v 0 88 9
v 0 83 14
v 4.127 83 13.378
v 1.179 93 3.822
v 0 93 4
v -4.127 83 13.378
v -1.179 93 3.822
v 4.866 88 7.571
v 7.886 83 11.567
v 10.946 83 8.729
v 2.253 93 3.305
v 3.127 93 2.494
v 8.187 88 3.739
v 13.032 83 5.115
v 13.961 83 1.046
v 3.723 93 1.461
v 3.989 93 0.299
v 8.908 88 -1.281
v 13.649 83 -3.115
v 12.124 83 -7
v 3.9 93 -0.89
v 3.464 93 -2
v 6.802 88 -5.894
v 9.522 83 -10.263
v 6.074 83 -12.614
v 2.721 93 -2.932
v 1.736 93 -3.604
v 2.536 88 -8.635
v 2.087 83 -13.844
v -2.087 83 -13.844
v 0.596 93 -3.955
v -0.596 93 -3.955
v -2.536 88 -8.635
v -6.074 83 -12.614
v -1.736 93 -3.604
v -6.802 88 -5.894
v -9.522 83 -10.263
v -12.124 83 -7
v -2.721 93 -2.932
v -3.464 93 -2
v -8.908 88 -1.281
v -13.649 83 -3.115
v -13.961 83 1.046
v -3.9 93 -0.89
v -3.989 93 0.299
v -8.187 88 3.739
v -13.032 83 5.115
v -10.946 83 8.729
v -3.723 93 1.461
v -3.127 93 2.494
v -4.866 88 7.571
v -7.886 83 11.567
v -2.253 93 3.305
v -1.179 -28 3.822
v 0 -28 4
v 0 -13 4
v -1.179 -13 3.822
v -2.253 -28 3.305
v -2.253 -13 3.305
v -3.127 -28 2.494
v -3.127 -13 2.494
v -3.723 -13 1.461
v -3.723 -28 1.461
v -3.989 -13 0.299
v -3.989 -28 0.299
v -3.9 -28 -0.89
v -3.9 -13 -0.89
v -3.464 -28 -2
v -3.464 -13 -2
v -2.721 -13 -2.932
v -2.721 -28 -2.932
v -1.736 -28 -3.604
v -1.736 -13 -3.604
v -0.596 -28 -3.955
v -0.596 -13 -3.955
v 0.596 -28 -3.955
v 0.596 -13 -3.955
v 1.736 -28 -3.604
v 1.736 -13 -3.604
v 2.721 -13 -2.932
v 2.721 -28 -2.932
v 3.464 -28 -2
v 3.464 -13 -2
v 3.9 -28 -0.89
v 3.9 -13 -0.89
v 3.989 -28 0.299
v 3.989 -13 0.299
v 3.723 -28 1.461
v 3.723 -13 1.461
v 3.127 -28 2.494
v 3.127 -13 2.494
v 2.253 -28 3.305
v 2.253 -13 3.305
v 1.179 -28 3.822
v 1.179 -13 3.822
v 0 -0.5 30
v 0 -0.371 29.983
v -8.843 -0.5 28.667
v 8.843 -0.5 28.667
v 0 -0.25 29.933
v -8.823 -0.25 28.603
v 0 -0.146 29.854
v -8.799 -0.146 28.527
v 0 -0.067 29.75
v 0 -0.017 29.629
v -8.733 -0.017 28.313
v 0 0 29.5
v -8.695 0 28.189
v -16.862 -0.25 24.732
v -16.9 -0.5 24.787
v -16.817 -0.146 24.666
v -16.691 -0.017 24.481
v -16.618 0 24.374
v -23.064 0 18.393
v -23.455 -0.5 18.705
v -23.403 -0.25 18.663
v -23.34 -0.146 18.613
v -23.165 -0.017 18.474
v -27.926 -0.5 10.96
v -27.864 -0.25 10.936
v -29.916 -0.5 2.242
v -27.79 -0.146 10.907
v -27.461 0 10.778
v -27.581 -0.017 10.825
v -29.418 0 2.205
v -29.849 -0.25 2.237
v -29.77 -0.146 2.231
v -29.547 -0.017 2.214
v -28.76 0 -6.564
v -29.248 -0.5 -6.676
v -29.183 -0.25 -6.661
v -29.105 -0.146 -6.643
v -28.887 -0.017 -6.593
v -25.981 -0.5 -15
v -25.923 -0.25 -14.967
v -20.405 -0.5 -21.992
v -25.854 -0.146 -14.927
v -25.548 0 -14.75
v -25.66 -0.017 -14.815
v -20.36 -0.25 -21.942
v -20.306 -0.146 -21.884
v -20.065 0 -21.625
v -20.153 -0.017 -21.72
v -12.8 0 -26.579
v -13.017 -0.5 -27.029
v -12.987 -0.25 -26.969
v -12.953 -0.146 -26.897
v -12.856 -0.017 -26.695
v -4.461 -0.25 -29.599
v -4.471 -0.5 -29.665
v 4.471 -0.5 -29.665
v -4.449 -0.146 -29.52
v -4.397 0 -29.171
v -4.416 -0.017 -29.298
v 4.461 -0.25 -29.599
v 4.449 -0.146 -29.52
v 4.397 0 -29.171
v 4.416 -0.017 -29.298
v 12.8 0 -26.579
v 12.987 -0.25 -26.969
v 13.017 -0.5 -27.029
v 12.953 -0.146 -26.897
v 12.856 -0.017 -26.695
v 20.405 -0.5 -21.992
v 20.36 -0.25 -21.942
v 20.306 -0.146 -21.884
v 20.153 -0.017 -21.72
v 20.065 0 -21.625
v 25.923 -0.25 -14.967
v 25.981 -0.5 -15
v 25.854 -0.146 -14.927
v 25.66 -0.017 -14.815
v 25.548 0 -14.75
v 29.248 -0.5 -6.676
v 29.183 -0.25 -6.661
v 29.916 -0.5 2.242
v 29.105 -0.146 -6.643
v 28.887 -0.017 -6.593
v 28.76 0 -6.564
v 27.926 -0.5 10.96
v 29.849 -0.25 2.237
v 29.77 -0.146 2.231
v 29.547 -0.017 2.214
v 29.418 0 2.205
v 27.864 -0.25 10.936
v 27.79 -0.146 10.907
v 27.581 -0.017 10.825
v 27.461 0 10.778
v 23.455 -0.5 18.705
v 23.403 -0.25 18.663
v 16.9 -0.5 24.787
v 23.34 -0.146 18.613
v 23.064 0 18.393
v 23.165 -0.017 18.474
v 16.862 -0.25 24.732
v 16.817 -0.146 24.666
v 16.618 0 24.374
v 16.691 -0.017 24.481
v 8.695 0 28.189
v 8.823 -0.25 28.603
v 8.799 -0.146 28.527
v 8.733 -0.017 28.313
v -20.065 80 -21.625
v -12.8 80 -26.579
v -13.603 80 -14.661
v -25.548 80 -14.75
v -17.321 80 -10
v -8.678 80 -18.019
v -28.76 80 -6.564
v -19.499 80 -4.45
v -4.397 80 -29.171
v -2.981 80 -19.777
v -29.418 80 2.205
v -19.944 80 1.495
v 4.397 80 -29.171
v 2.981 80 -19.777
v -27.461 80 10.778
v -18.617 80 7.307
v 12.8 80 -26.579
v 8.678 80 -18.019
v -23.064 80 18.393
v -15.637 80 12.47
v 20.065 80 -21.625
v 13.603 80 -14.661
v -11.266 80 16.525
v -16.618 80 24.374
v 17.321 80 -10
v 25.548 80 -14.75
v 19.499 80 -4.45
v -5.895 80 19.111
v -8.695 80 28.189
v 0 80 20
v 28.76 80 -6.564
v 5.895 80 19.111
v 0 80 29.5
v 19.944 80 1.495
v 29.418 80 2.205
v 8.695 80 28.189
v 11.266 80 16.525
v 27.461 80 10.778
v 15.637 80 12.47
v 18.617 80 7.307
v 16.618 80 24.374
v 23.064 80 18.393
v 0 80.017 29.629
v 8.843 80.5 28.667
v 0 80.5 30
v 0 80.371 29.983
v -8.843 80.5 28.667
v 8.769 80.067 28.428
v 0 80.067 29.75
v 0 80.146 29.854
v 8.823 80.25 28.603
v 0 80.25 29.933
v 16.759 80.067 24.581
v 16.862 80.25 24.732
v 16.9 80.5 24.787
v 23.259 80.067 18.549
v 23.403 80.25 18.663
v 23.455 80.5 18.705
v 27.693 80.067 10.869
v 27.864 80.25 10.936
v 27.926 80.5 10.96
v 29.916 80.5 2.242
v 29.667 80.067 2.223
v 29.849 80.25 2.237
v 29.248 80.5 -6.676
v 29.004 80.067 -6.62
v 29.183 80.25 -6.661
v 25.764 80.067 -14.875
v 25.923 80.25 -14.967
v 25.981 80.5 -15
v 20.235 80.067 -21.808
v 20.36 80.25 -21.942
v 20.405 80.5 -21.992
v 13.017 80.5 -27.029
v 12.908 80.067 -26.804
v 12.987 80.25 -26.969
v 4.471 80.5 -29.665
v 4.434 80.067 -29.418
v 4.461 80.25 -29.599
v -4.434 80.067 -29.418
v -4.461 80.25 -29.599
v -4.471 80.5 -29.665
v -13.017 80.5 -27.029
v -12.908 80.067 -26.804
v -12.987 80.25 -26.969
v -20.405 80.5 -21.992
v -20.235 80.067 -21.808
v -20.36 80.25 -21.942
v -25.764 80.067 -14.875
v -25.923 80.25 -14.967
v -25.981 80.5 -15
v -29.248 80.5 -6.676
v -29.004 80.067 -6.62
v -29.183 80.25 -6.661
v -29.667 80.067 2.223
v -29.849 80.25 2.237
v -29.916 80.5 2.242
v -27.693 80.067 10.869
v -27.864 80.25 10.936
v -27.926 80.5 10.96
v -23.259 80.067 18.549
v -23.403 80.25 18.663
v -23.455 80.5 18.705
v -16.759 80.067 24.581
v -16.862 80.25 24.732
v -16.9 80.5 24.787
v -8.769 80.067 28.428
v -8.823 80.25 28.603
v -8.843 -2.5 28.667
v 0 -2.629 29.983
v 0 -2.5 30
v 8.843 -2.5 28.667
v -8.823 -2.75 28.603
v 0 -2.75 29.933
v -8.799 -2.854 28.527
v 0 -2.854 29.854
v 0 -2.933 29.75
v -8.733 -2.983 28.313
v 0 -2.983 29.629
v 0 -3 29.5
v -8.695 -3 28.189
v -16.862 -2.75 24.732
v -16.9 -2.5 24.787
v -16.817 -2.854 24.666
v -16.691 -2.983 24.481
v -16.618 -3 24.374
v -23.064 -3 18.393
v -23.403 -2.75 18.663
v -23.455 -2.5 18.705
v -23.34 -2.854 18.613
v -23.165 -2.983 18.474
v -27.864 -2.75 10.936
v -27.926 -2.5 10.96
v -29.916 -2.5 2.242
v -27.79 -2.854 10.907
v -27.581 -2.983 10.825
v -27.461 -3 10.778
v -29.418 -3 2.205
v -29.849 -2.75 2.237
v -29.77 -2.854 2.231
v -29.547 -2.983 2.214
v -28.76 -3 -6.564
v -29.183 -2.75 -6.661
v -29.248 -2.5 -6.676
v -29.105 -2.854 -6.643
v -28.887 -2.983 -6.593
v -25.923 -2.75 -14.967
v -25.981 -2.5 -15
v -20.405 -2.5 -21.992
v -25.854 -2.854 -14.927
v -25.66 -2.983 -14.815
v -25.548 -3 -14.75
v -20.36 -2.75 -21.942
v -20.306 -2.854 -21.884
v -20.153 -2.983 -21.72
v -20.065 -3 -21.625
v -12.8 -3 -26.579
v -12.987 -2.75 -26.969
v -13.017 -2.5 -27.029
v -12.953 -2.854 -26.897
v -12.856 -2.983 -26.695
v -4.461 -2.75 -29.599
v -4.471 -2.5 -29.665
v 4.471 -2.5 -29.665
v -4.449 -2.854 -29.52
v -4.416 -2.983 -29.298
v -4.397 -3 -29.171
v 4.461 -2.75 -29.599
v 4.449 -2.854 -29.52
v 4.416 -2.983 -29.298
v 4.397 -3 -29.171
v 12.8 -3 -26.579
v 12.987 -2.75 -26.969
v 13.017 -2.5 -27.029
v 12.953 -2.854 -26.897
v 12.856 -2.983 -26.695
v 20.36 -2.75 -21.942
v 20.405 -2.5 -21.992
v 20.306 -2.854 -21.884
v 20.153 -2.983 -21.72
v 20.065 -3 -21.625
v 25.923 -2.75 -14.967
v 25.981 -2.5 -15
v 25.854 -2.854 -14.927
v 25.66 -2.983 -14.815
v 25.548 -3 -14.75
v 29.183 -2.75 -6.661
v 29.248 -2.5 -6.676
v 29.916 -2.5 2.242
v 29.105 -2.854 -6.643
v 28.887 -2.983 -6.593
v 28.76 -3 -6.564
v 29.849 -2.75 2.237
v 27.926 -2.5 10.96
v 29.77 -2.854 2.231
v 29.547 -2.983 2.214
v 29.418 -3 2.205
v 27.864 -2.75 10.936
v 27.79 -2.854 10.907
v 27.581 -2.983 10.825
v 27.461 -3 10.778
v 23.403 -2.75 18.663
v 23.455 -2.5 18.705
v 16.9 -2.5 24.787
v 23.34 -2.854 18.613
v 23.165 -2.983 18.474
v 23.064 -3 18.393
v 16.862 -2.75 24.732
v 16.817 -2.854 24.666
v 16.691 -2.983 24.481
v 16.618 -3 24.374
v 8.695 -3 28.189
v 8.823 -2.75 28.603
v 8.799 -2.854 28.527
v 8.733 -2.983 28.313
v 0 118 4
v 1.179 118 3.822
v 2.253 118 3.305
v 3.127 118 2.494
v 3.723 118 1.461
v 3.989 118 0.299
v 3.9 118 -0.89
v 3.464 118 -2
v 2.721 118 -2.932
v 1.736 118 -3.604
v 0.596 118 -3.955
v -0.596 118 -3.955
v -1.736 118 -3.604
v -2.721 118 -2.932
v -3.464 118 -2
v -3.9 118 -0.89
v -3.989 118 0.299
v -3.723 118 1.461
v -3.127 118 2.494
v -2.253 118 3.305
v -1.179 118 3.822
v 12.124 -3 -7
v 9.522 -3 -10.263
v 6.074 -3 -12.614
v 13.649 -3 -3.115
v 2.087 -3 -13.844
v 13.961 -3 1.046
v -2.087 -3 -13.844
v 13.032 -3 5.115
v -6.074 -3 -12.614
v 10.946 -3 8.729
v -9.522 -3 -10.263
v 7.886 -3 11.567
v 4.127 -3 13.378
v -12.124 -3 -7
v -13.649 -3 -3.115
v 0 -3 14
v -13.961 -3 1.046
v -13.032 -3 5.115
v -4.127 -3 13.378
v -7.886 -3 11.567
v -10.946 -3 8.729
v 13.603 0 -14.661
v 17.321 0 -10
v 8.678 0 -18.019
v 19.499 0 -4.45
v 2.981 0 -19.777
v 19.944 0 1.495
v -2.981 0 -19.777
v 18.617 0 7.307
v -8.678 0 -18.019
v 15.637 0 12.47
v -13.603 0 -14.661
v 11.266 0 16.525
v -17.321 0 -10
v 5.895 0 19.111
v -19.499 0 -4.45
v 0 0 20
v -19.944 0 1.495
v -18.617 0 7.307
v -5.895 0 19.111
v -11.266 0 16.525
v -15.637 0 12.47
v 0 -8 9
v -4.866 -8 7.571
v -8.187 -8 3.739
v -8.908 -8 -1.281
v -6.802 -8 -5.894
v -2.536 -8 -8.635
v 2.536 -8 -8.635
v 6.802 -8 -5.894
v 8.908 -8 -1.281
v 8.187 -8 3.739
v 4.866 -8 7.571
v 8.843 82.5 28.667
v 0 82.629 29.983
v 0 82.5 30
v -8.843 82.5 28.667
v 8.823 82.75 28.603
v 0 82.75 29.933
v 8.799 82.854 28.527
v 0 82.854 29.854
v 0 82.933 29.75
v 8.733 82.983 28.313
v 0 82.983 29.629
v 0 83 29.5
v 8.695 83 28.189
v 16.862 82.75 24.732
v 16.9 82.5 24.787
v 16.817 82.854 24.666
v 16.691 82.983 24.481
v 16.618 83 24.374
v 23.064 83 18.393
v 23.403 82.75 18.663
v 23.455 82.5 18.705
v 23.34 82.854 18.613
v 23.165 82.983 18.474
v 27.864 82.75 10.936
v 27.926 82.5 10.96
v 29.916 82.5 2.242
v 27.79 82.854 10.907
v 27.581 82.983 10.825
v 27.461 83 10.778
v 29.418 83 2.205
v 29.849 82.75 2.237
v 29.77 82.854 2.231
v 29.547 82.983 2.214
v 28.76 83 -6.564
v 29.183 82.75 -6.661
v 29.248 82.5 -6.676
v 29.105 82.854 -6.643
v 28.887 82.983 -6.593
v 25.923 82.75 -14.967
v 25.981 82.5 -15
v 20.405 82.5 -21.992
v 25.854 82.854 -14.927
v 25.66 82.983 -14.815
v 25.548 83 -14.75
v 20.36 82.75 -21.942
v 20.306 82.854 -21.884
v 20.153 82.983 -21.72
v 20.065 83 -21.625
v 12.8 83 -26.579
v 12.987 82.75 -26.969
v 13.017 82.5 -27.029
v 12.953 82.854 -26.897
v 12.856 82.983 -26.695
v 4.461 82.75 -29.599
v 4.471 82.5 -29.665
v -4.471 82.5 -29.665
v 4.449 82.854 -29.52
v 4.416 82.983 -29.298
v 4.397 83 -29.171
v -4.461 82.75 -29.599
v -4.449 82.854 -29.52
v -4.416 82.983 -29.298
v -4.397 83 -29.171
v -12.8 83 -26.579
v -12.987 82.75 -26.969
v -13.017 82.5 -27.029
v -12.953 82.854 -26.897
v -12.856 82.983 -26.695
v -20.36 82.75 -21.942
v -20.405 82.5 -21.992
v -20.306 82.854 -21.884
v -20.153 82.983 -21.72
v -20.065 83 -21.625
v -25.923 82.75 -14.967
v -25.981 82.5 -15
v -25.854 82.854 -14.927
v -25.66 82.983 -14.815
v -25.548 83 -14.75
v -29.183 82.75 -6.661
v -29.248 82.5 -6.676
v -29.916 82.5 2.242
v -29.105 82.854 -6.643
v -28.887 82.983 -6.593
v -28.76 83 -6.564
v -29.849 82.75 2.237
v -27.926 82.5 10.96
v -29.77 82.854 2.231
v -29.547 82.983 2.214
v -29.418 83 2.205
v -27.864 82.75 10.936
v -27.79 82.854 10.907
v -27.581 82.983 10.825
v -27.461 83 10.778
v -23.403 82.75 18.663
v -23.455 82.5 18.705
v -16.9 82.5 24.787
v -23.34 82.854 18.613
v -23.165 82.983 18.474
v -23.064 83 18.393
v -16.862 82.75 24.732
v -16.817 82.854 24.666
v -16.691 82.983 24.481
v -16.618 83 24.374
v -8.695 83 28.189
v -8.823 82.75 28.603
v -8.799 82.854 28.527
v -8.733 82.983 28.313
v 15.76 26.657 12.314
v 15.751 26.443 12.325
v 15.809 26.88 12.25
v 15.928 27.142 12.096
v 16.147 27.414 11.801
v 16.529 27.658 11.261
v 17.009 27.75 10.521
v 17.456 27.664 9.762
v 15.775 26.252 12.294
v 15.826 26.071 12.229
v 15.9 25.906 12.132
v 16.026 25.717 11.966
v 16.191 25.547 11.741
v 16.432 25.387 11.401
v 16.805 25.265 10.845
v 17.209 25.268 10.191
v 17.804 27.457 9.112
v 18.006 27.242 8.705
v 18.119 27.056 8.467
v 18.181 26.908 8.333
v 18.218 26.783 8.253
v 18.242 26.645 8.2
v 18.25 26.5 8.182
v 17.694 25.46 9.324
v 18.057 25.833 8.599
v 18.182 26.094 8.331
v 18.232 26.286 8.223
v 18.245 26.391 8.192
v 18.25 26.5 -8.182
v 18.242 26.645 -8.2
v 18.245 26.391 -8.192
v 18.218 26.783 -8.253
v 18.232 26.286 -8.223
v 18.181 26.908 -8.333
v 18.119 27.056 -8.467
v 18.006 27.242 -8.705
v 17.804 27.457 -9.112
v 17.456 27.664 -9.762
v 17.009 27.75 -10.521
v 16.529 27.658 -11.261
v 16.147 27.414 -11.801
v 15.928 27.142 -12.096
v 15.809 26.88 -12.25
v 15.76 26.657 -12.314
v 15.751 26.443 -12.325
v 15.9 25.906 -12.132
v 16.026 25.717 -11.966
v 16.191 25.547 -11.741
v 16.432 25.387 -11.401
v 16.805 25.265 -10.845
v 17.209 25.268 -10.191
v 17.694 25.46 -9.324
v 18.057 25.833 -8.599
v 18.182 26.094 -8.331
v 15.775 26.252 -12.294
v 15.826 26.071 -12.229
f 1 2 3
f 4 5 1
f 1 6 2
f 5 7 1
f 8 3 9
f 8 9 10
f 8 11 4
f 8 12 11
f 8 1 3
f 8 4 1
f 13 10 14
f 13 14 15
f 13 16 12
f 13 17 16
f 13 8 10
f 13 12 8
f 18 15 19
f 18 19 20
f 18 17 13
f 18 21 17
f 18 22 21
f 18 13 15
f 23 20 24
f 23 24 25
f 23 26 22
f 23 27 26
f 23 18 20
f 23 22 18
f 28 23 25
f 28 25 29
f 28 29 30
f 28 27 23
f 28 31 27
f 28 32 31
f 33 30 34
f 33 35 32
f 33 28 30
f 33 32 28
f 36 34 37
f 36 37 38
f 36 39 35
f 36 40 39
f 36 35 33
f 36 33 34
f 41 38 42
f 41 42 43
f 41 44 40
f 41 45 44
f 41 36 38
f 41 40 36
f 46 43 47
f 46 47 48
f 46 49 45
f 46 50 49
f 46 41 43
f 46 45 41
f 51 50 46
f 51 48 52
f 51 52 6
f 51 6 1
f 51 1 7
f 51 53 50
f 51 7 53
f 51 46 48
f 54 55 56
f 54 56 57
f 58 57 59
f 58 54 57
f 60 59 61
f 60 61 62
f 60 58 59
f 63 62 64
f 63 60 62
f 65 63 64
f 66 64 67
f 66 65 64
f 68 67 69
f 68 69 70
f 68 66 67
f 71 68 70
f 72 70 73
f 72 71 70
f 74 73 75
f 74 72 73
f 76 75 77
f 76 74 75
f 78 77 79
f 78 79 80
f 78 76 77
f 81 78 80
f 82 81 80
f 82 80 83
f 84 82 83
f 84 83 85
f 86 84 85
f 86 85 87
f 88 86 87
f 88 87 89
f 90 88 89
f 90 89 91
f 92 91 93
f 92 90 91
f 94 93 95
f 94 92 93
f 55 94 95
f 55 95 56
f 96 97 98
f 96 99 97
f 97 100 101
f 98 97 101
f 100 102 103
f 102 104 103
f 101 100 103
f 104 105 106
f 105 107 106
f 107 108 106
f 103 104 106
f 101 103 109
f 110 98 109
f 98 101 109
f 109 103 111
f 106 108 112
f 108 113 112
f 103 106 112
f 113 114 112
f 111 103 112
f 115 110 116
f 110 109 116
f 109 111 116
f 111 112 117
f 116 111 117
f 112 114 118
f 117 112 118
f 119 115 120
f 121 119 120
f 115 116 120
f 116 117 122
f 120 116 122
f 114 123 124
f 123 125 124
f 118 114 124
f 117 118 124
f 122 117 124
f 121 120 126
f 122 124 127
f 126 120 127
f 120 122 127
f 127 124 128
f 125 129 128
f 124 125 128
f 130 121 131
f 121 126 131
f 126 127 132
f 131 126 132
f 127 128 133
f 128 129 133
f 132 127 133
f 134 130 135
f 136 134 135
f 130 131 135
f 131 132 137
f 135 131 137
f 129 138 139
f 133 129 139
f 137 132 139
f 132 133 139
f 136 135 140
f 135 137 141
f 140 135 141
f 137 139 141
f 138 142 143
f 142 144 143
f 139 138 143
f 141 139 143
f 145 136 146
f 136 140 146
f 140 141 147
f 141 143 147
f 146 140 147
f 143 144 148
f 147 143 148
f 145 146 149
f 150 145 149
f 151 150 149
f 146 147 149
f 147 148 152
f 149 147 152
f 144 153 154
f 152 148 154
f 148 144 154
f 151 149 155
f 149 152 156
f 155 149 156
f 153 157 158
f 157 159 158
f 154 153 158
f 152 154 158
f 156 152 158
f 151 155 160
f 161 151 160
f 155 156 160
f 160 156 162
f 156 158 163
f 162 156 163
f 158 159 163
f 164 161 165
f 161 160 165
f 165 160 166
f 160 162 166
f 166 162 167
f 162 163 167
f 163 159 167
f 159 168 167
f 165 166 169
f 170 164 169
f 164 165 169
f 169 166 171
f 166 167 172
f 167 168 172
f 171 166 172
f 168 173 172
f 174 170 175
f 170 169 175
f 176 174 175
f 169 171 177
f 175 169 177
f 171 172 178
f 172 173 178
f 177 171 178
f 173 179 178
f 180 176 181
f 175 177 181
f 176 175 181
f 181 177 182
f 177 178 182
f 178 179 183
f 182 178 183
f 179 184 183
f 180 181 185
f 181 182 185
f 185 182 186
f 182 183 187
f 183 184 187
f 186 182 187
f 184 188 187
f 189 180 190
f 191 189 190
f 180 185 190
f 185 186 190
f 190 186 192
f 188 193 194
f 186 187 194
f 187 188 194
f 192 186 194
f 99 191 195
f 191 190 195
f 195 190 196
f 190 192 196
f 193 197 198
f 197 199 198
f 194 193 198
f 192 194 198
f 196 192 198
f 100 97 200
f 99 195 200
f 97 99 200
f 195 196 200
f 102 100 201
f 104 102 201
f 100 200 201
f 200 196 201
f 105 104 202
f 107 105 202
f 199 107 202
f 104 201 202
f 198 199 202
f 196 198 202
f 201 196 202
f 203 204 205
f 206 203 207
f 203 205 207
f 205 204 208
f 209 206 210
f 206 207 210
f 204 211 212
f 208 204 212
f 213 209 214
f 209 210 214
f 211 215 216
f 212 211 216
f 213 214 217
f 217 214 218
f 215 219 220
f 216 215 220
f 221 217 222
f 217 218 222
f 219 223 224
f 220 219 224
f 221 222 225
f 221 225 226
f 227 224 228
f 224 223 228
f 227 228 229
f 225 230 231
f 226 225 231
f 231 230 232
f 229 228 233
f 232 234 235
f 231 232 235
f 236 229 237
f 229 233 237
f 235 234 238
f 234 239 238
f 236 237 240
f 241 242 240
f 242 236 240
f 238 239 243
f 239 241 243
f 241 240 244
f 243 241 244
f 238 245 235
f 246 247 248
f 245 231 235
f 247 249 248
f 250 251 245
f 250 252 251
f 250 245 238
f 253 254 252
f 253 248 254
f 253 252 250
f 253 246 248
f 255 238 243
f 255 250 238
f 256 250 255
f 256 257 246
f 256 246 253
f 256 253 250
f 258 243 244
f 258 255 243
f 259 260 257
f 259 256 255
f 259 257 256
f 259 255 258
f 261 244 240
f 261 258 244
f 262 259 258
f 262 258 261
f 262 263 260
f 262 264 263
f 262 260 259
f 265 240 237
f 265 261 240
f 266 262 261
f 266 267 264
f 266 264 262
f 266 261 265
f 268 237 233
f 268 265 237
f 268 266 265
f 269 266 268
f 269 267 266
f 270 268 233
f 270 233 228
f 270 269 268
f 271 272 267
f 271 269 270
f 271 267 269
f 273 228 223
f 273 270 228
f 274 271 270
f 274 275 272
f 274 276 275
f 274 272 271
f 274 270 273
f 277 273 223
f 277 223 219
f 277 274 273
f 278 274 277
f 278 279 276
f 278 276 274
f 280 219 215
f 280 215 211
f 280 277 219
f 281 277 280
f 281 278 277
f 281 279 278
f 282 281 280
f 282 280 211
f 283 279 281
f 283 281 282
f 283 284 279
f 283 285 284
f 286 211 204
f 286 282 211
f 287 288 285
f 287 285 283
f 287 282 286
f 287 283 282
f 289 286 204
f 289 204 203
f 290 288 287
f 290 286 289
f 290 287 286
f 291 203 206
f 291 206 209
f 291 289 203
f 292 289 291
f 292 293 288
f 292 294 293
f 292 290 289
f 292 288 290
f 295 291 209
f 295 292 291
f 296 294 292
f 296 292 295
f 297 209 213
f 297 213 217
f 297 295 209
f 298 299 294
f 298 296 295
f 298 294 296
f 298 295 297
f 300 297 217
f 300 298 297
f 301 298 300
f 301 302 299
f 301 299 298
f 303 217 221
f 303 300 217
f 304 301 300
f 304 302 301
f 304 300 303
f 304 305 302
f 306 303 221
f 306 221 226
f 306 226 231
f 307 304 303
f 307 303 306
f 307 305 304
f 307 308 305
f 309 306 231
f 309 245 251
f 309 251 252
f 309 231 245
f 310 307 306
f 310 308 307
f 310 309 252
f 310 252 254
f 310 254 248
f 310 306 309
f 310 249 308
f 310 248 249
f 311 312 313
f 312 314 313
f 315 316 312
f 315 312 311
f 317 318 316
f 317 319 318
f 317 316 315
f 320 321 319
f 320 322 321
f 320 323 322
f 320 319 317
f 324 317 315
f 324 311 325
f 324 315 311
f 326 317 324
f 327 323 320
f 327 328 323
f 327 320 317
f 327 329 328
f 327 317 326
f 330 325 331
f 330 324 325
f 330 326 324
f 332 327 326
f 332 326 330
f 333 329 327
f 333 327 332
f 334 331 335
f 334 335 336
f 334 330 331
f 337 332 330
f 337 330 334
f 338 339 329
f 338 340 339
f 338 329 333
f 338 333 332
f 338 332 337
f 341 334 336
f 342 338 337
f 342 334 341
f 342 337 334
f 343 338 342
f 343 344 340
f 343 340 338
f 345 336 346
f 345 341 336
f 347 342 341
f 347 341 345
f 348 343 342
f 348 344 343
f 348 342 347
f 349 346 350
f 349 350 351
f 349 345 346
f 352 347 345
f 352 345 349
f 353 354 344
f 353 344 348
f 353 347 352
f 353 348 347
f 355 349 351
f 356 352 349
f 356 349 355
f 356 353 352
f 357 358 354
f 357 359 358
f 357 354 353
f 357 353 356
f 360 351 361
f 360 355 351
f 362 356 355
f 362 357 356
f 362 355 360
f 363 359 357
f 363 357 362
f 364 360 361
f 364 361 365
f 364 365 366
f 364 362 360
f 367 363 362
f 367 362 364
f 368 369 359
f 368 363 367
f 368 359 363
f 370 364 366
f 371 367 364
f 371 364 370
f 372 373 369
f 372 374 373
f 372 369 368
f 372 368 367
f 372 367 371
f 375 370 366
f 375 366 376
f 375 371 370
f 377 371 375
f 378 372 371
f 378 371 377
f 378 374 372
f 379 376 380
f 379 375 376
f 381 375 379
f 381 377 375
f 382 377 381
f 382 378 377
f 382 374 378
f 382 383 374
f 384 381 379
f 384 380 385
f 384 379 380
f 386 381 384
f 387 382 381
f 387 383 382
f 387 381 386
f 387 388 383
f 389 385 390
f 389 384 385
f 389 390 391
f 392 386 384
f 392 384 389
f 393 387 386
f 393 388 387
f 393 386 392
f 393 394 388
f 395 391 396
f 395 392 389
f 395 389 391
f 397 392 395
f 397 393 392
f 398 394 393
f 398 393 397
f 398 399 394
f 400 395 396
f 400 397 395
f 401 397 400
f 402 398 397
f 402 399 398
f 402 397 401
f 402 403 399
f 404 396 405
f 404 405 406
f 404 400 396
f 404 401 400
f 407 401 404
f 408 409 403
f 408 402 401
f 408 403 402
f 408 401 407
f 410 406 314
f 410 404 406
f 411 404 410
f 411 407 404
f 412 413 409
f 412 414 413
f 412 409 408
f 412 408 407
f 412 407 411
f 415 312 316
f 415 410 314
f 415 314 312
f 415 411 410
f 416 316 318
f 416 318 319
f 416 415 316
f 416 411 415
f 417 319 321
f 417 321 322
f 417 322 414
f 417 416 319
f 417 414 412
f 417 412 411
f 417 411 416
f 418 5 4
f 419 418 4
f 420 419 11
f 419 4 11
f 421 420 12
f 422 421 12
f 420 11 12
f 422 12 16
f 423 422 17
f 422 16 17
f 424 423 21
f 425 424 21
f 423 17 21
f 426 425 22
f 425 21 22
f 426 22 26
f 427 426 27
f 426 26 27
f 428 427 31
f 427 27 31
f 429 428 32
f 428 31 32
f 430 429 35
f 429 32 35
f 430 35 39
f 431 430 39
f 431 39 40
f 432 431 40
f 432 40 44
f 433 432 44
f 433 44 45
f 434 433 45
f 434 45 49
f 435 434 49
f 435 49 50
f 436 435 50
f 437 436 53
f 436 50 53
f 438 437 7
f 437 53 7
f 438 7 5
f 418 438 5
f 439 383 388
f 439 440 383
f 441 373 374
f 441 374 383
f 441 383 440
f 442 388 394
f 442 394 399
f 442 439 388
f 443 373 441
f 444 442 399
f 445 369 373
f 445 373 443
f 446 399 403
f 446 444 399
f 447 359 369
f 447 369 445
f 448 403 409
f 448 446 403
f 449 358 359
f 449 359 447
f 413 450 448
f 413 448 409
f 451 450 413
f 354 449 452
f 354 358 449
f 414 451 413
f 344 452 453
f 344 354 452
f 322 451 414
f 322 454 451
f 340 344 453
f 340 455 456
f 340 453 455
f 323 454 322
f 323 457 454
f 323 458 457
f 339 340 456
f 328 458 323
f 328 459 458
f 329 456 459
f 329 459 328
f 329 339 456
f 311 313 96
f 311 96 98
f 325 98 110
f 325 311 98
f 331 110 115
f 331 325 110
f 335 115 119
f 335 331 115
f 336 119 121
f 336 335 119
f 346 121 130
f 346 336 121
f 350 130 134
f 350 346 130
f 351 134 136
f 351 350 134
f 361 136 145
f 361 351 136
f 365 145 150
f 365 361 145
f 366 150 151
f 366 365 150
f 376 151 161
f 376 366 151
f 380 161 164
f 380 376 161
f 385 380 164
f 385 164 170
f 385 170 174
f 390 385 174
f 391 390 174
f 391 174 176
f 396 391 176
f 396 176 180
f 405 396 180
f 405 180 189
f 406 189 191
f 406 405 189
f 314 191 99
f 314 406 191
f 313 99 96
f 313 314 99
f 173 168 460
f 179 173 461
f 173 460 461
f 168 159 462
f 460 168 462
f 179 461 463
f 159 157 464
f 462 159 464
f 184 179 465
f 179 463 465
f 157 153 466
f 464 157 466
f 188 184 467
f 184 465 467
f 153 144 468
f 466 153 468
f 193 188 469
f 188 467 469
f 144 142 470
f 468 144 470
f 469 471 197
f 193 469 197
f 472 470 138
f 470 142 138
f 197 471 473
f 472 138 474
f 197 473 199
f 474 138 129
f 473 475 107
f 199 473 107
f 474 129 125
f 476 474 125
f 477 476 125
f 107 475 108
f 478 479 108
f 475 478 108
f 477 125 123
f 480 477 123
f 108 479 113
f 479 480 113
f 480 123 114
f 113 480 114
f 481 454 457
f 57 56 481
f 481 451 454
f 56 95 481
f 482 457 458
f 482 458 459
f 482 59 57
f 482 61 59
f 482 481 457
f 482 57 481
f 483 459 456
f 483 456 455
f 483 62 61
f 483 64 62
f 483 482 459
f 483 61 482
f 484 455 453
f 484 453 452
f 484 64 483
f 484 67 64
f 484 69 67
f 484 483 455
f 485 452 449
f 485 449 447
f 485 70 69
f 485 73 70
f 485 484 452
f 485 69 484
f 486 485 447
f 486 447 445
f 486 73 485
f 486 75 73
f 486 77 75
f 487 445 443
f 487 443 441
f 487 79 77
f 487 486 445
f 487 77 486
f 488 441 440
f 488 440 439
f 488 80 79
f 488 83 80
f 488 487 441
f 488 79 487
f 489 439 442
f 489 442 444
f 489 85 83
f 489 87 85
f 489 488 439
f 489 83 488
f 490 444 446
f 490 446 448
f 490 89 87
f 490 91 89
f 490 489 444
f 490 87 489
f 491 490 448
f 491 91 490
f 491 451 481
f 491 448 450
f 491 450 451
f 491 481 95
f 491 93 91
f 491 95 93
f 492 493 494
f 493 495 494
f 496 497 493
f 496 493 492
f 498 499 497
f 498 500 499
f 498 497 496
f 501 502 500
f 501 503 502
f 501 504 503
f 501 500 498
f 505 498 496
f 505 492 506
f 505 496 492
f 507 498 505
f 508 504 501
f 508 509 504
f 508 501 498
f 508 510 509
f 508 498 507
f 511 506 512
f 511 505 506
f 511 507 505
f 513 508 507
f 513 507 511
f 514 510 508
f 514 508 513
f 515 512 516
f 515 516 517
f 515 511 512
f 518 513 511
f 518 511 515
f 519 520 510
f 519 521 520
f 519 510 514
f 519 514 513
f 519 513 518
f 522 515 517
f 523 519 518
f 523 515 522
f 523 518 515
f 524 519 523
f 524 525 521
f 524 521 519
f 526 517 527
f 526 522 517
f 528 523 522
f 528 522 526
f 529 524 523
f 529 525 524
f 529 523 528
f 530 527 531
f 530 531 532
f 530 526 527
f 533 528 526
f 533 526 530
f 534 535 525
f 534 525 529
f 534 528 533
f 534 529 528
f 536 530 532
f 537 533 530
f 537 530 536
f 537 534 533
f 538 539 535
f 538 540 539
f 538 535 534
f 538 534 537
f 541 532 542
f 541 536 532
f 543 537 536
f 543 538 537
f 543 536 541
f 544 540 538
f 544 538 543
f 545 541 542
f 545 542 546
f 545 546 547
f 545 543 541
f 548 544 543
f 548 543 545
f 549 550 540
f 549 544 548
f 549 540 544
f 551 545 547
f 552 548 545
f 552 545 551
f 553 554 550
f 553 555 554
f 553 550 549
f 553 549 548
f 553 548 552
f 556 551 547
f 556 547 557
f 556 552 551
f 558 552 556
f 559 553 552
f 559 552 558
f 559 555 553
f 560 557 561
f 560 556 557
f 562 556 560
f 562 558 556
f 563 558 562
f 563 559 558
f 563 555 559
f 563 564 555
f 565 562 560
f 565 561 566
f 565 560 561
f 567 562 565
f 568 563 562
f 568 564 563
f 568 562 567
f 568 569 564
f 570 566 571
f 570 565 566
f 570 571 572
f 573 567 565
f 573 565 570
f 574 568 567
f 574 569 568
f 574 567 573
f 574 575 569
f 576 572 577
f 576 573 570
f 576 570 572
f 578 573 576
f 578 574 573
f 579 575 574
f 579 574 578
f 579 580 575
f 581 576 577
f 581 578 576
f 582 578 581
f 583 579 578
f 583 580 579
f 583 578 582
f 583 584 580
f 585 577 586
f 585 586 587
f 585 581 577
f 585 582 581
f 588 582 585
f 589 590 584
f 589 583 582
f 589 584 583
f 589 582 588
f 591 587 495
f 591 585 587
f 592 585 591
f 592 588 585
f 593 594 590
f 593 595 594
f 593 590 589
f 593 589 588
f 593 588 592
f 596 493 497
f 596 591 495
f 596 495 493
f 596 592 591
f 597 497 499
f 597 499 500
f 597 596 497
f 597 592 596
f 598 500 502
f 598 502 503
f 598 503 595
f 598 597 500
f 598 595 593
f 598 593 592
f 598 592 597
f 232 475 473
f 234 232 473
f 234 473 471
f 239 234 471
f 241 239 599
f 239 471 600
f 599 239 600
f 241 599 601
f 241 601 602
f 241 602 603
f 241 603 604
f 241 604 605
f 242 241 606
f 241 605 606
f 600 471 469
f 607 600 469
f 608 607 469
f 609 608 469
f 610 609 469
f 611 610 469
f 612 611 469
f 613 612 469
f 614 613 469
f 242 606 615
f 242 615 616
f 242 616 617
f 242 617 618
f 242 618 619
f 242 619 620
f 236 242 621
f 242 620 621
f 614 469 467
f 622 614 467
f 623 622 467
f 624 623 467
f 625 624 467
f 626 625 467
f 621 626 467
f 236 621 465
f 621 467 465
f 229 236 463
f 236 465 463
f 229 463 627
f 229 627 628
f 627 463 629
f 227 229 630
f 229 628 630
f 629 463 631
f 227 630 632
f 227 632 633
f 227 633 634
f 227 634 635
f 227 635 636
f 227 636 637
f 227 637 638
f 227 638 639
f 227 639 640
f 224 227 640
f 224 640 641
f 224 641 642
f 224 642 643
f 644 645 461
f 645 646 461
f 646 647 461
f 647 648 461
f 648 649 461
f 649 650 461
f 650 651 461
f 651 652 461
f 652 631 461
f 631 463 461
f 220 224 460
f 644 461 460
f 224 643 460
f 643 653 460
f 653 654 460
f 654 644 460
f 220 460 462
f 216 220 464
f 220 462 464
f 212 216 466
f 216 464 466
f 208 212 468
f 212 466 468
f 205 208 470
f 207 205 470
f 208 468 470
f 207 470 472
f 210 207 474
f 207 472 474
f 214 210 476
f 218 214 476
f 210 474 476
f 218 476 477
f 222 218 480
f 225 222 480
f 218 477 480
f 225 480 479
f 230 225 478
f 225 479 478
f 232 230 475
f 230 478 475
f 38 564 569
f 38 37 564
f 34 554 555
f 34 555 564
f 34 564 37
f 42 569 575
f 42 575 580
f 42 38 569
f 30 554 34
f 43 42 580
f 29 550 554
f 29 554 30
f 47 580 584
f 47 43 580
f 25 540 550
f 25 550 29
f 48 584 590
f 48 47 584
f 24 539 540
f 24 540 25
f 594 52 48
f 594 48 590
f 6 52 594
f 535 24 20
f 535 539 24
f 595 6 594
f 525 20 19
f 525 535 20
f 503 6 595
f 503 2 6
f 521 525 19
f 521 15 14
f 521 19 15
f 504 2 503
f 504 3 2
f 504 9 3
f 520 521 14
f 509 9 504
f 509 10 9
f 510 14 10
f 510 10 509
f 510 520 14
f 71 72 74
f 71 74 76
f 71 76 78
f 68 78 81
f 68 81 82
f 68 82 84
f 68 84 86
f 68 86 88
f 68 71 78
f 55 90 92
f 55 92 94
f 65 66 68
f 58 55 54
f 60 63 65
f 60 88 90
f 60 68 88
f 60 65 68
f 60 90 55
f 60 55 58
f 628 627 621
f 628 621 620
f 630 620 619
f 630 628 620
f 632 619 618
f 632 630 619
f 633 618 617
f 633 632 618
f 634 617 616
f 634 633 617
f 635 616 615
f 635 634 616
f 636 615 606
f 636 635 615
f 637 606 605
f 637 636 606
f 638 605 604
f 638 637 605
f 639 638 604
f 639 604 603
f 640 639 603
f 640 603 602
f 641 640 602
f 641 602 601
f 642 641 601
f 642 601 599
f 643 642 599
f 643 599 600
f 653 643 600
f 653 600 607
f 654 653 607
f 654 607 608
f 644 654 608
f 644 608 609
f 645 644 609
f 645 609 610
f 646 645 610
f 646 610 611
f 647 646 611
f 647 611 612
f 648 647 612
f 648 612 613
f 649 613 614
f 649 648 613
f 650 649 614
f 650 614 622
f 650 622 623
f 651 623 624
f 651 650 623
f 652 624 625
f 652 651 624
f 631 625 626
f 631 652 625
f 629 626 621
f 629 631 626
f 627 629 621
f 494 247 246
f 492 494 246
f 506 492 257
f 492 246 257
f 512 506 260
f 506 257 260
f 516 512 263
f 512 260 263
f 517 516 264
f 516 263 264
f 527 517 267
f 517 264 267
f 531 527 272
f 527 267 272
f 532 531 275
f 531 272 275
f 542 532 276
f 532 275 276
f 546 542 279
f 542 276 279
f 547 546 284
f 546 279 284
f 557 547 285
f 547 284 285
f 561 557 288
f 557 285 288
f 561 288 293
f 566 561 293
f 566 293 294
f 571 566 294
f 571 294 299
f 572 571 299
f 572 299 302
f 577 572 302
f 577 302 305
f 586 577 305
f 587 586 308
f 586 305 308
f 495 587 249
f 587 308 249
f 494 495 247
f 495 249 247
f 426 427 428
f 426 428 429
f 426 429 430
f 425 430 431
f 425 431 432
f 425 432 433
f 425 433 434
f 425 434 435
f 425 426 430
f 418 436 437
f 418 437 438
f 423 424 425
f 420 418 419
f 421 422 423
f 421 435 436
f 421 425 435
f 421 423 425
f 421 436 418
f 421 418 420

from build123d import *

# Parameters (mm, degrees)
SKETCH_1_R               = 20
EXTRUDE_1_DEPTH          = 80
SKETCH_2_R               = 30
EXTRUDE_2_DEPTH          = 3
EXTRUDE_START            = 3
SKETCH_3_R               = 30
EXTRUDE_3_DEPTH          = 3
CUT_EXTRUDE_1_DEPTH      = 94.214805691
CUT_EXTRUDE_1_DEPTH_BACK = 94.214805691
SKETCH_4_R               = 1.25
FILLET_1_R               = 0.5
SKETCH_5_R               = 4
EXTRUDE_4_DEPTH          = 35
EXTRUDE_START_2          = 25
SKETCH_6_R               = 4
EXTRUDE_5_DEPTH          = 25
CHAMFER_4_SIZE           = 10
CHAMFER_5_SIZE           = 10


with BuildPart() as part:
    # 草图1 → 凸台-拉伸1 (new body)
    with BuildSketch(Plane(origin=(0, 0, 0), x_dir=(1, 0, 0), z_dir=(0, 1, 0))):
        with Locations(Location((0, 0, 0), (0, 0, 270))):
            Circle(SKETCH_1_R)
    extrude(amount=EXTRUDE_1_DEPTH)

    # 草图2 → 凸台-拉伸2 (add)
    with BuildSketch(Plane(origin=(0, 80, 0), x_dir=(1, 0, 0), z_dir=(0, 1, 0))):
        with Locations(Location((0, 0, 0), (0, 0, 270))):
            Circle(SKETCH_2_R)
    extrude(amount=EXTRUDE_2_DEPTH)

    # 草图3 → 凸台-拉伸3 (add)
    with BuildSketch(Plane.XZ.offset(EXTRUDE_START)):
        with Locations(Location((0, 0, 0), (0, 0, 90))):
            Circle(SKETCH_3_R)
    extrude(amount=-EXTRUDE_3_DEPTH)

    # 草图4 → 切除-拉伸1 (cut, two sides: drawn at the far end of the back side and taken through both)
    with BuildSketch(Plane.XY.offset(-CUT_EXTRUDE_1_DEPTH_BACK)):
        with Locations((17, 26.5)):
            Circle(SKETCH_4_R)
    extrude(amount=CUT_EXTRUDE_1_DEPTH + CUT_EXTRUDE_1_DEPTH_BACK, mode=Mode.SUBTRACT)

    # 圆角1
    fillet_1_edges = [part.edges().sort_by_distance(p)[0] for p in [
        (0, 0, -30),
        (0, -3, -30),
        (0, 80, -30),
        (0, 83, -30),
    ]]
    fillet(fillet_1_edges, radius=FILLET_1_R)

    # 草图5 → 凸台-拉伸4 (add)
    with BuildSketch(Plane(origin=(0, 83, 0), x_dir=(1, 0, 0), z_dir=(0, 1, 0))):
        with Locations(Location((0, 0, 0), (0, 0, 270))):
            Circle(SKETCH_5_R)
    extrude(amount=EXTRUDE_4_DEPTH)

    # 草图6 → 凸台-拉伸5 (add)
    with BuildSketch(Plane(origin=(0, -3, 0), x_dir=(-1, 0, 0), z_dir=(0, -1, 0)).offset(EXTRUDE_START_2)):
        with Locations(Location((0, 0, 0), (0, 0, 270))):
            Circle(SKETCH_6_R)
    extrude(amount=-EXTRUDE_5_DEPTH)

    # 倒角4
    chamfer_4_edges = [part.edges().sort_by_distance(p)[0] for p in [
        (0, 83, -4),
    ]]
    chamfer(chamfer_4_edges, length=CHAMFER_4_SIZE)

    # 倒角5
    chamfer_5_edges = [part.edges().sort_by_distance(p)[0] for p in [
        (0, -3, -4),
    ]]
    chamfer(chamfer_5_edges, length=CHAMFER_5_SIZE)


solid = part.part
